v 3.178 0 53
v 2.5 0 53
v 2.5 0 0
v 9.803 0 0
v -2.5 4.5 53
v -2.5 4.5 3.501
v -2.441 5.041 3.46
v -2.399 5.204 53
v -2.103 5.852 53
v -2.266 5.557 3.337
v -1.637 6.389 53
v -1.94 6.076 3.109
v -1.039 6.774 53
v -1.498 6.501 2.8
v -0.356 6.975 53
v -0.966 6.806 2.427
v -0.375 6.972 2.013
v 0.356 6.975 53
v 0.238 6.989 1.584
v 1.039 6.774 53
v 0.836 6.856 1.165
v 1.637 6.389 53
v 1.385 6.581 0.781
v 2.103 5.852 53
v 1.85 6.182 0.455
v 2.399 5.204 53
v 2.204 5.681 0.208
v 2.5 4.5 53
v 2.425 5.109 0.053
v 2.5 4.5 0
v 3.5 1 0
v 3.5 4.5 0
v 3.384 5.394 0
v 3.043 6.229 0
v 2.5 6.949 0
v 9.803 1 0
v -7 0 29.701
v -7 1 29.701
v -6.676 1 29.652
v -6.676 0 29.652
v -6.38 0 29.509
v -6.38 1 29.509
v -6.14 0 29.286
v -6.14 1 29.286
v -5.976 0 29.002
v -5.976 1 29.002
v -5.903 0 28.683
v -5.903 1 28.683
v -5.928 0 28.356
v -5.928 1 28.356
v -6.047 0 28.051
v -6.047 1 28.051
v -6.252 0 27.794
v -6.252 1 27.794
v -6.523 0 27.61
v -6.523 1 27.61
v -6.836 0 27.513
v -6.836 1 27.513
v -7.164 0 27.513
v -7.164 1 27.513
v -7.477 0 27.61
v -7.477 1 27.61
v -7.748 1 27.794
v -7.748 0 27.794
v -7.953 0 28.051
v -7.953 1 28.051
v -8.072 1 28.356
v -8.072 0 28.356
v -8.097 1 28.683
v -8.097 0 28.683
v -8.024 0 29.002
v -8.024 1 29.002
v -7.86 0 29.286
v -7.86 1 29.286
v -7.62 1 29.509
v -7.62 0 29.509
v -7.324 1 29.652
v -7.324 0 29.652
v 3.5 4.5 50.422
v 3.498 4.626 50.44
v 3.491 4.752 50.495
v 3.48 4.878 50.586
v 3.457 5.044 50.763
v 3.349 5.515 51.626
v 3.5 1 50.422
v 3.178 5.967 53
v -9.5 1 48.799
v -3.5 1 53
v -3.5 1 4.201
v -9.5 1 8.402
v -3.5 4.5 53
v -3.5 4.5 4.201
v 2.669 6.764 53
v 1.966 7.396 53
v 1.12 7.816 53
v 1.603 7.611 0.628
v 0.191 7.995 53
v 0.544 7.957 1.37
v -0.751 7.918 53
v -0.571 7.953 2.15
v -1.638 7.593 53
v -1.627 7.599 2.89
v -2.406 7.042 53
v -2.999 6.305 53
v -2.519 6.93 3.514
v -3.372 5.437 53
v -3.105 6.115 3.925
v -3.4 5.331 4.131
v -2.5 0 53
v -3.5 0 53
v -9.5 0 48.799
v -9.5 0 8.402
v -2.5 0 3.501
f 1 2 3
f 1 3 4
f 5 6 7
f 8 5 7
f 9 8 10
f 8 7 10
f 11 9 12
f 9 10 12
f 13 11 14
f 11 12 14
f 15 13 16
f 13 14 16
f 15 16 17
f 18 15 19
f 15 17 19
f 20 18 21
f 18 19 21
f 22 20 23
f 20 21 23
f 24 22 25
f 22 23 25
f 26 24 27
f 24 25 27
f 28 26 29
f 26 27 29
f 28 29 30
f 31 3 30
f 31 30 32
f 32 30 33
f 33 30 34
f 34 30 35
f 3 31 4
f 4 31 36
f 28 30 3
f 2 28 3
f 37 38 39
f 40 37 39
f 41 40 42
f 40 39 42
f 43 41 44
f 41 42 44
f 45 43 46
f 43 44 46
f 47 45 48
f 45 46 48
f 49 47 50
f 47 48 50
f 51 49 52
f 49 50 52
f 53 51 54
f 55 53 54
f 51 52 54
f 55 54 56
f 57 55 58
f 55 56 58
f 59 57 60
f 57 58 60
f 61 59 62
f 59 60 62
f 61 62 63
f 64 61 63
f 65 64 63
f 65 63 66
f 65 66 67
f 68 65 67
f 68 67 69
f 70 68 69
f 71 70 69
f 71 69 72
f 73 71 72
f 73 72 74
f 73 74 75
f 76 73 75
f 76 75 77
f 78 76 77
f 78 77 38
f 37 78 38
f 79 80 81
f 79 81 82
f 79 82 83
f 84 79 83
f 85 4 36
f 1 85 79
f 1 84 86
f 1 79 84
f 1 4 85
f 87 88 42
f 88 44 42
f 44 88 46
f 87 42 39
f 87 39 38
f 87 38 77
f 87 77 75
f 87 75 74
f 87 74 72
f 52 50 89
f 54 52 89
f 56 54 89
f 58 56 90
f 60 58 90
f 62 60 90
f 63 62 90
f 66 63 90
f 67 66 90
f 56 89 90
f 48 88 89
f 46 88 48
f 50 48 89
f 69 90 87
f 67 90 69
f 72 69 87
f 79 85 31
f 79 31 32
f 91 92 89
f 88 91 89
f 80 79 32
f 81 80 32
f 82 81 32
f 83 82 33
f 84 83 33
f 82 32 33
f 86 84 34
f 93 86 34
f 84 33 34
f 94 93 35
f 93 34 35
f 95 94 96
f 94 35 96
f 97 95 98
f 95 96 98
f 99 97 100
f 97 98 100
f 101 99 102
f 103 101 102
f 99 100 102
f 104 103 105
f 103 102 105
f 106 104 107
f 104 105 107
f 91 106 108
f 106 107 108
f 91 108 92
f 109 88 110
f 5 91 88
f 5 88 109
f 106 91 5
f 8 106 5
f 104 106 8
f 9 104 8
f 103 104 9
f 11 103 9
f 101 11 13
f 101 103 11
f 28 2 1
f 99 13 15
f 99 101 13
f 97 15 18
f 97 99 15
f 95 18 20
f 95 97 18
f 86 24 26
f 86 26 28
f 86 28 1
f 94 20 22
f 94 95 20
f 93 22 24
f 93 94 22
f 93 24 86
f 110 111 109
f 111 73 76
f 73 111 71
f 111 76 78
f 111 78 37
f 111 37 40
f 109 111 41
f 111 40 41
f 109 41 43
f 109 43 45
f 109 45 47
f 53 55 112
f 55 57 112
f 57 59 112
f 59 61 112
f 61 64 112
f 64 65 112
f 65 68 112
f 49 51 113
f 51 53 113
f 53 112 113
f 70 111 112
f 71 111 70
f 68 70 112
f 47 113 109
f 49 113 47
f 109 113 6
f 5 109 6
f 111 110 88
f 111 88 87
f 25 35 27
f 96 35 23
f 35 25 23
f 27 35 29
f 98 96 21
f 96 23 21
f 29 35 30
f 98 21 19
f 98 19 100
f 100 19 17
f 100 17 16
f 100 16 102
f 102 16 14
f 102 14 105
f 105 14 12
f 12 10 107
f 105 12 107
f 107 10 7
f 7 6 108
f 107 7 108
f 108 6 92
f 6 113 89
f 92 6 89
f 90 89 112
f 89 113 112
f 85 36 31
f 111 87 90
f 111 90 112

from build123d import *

# Parameters (mm, degrees)
EXTRU_MINCE1_DEPTH      = 53
ENL_V_MAT_EXTRU_1_DEPTH = 57.384838388
ESQUISSE3_R             = 1.1
ENL_V_MAT_EXTRU_2_DEPTH = 55.351611691


with BuildPart() as part:
    # Esquisse1 → Extru.-Mince1 (new body)
    with BuildSketch(Plane.XY):
        with BuildLine():
            Line((-9.5, 0), (-2.5, 0))
            Line((-2.5, 0), (-2.5, 4.5))
            ThreePointArc((-2.5, 4.5), (0, 7), (2.5, 4.5))
            Line((2.5, 4.5), (2.5, 0))
            Line((2.5, 0), (17.5, 0))
            Line((17.5, 0), (17.5, 1))
            Line((17.5, 1), (3.5, 1))
            Line((3.5, 1), (3.5, 4.5))
            ThreePointArc((3.5, 4.5), (0, 8), (-3.5, 4.5))
            Line((-3.5, 4.5), (-3.5, 1))
            Line((-3.5, 1), (-9.5, 1))
            Line((-9.5, 1), (-9.5, 0))
        make_face()
    extrude(amount=EXTRU_MINCE1_DEPTH)

    # Esquisse2 → Enlèv. mat.-Extru.1 (cut, through all)
    with BuildSketch(Plane(origin=(0, 0, 0), x_dir=(1, 0, 0), z_dir=(0, 1, 0))):
        Polygon((2.5, 0), (-9.5, -8.402490459), (-9.5, 0), align=None)
        Polygon((17.5, -53), (17.5, 61.57469904), (3.177754145, -53), align=None)
        Polygon((-9.5, -48.798754771), (-9.5, -53), (-3.5, -53), align=None)
    extrude(amount=ENL_V_MAT_EXTRU_1_DEPTH, mode=Mode.SUBTRACT)

    # Esquisse3 → Enlèv. mat.-Extru.2 (cut, through all)
    with BuildSketch(Plane(origin=(0, 1, 0), x_dir=(1, 0, 0), z_dir=(0, 1, 0))):
        with Locations(Location((-7, -28.600622615, 0), (0, 0, 270))):
            Circle(ESQUISSE3_R)
    extrude(amount=-ENL_V_MAT_EXTRU_2_DEPTH, mode=Mode.SUBTRACT)


solid = part.part
